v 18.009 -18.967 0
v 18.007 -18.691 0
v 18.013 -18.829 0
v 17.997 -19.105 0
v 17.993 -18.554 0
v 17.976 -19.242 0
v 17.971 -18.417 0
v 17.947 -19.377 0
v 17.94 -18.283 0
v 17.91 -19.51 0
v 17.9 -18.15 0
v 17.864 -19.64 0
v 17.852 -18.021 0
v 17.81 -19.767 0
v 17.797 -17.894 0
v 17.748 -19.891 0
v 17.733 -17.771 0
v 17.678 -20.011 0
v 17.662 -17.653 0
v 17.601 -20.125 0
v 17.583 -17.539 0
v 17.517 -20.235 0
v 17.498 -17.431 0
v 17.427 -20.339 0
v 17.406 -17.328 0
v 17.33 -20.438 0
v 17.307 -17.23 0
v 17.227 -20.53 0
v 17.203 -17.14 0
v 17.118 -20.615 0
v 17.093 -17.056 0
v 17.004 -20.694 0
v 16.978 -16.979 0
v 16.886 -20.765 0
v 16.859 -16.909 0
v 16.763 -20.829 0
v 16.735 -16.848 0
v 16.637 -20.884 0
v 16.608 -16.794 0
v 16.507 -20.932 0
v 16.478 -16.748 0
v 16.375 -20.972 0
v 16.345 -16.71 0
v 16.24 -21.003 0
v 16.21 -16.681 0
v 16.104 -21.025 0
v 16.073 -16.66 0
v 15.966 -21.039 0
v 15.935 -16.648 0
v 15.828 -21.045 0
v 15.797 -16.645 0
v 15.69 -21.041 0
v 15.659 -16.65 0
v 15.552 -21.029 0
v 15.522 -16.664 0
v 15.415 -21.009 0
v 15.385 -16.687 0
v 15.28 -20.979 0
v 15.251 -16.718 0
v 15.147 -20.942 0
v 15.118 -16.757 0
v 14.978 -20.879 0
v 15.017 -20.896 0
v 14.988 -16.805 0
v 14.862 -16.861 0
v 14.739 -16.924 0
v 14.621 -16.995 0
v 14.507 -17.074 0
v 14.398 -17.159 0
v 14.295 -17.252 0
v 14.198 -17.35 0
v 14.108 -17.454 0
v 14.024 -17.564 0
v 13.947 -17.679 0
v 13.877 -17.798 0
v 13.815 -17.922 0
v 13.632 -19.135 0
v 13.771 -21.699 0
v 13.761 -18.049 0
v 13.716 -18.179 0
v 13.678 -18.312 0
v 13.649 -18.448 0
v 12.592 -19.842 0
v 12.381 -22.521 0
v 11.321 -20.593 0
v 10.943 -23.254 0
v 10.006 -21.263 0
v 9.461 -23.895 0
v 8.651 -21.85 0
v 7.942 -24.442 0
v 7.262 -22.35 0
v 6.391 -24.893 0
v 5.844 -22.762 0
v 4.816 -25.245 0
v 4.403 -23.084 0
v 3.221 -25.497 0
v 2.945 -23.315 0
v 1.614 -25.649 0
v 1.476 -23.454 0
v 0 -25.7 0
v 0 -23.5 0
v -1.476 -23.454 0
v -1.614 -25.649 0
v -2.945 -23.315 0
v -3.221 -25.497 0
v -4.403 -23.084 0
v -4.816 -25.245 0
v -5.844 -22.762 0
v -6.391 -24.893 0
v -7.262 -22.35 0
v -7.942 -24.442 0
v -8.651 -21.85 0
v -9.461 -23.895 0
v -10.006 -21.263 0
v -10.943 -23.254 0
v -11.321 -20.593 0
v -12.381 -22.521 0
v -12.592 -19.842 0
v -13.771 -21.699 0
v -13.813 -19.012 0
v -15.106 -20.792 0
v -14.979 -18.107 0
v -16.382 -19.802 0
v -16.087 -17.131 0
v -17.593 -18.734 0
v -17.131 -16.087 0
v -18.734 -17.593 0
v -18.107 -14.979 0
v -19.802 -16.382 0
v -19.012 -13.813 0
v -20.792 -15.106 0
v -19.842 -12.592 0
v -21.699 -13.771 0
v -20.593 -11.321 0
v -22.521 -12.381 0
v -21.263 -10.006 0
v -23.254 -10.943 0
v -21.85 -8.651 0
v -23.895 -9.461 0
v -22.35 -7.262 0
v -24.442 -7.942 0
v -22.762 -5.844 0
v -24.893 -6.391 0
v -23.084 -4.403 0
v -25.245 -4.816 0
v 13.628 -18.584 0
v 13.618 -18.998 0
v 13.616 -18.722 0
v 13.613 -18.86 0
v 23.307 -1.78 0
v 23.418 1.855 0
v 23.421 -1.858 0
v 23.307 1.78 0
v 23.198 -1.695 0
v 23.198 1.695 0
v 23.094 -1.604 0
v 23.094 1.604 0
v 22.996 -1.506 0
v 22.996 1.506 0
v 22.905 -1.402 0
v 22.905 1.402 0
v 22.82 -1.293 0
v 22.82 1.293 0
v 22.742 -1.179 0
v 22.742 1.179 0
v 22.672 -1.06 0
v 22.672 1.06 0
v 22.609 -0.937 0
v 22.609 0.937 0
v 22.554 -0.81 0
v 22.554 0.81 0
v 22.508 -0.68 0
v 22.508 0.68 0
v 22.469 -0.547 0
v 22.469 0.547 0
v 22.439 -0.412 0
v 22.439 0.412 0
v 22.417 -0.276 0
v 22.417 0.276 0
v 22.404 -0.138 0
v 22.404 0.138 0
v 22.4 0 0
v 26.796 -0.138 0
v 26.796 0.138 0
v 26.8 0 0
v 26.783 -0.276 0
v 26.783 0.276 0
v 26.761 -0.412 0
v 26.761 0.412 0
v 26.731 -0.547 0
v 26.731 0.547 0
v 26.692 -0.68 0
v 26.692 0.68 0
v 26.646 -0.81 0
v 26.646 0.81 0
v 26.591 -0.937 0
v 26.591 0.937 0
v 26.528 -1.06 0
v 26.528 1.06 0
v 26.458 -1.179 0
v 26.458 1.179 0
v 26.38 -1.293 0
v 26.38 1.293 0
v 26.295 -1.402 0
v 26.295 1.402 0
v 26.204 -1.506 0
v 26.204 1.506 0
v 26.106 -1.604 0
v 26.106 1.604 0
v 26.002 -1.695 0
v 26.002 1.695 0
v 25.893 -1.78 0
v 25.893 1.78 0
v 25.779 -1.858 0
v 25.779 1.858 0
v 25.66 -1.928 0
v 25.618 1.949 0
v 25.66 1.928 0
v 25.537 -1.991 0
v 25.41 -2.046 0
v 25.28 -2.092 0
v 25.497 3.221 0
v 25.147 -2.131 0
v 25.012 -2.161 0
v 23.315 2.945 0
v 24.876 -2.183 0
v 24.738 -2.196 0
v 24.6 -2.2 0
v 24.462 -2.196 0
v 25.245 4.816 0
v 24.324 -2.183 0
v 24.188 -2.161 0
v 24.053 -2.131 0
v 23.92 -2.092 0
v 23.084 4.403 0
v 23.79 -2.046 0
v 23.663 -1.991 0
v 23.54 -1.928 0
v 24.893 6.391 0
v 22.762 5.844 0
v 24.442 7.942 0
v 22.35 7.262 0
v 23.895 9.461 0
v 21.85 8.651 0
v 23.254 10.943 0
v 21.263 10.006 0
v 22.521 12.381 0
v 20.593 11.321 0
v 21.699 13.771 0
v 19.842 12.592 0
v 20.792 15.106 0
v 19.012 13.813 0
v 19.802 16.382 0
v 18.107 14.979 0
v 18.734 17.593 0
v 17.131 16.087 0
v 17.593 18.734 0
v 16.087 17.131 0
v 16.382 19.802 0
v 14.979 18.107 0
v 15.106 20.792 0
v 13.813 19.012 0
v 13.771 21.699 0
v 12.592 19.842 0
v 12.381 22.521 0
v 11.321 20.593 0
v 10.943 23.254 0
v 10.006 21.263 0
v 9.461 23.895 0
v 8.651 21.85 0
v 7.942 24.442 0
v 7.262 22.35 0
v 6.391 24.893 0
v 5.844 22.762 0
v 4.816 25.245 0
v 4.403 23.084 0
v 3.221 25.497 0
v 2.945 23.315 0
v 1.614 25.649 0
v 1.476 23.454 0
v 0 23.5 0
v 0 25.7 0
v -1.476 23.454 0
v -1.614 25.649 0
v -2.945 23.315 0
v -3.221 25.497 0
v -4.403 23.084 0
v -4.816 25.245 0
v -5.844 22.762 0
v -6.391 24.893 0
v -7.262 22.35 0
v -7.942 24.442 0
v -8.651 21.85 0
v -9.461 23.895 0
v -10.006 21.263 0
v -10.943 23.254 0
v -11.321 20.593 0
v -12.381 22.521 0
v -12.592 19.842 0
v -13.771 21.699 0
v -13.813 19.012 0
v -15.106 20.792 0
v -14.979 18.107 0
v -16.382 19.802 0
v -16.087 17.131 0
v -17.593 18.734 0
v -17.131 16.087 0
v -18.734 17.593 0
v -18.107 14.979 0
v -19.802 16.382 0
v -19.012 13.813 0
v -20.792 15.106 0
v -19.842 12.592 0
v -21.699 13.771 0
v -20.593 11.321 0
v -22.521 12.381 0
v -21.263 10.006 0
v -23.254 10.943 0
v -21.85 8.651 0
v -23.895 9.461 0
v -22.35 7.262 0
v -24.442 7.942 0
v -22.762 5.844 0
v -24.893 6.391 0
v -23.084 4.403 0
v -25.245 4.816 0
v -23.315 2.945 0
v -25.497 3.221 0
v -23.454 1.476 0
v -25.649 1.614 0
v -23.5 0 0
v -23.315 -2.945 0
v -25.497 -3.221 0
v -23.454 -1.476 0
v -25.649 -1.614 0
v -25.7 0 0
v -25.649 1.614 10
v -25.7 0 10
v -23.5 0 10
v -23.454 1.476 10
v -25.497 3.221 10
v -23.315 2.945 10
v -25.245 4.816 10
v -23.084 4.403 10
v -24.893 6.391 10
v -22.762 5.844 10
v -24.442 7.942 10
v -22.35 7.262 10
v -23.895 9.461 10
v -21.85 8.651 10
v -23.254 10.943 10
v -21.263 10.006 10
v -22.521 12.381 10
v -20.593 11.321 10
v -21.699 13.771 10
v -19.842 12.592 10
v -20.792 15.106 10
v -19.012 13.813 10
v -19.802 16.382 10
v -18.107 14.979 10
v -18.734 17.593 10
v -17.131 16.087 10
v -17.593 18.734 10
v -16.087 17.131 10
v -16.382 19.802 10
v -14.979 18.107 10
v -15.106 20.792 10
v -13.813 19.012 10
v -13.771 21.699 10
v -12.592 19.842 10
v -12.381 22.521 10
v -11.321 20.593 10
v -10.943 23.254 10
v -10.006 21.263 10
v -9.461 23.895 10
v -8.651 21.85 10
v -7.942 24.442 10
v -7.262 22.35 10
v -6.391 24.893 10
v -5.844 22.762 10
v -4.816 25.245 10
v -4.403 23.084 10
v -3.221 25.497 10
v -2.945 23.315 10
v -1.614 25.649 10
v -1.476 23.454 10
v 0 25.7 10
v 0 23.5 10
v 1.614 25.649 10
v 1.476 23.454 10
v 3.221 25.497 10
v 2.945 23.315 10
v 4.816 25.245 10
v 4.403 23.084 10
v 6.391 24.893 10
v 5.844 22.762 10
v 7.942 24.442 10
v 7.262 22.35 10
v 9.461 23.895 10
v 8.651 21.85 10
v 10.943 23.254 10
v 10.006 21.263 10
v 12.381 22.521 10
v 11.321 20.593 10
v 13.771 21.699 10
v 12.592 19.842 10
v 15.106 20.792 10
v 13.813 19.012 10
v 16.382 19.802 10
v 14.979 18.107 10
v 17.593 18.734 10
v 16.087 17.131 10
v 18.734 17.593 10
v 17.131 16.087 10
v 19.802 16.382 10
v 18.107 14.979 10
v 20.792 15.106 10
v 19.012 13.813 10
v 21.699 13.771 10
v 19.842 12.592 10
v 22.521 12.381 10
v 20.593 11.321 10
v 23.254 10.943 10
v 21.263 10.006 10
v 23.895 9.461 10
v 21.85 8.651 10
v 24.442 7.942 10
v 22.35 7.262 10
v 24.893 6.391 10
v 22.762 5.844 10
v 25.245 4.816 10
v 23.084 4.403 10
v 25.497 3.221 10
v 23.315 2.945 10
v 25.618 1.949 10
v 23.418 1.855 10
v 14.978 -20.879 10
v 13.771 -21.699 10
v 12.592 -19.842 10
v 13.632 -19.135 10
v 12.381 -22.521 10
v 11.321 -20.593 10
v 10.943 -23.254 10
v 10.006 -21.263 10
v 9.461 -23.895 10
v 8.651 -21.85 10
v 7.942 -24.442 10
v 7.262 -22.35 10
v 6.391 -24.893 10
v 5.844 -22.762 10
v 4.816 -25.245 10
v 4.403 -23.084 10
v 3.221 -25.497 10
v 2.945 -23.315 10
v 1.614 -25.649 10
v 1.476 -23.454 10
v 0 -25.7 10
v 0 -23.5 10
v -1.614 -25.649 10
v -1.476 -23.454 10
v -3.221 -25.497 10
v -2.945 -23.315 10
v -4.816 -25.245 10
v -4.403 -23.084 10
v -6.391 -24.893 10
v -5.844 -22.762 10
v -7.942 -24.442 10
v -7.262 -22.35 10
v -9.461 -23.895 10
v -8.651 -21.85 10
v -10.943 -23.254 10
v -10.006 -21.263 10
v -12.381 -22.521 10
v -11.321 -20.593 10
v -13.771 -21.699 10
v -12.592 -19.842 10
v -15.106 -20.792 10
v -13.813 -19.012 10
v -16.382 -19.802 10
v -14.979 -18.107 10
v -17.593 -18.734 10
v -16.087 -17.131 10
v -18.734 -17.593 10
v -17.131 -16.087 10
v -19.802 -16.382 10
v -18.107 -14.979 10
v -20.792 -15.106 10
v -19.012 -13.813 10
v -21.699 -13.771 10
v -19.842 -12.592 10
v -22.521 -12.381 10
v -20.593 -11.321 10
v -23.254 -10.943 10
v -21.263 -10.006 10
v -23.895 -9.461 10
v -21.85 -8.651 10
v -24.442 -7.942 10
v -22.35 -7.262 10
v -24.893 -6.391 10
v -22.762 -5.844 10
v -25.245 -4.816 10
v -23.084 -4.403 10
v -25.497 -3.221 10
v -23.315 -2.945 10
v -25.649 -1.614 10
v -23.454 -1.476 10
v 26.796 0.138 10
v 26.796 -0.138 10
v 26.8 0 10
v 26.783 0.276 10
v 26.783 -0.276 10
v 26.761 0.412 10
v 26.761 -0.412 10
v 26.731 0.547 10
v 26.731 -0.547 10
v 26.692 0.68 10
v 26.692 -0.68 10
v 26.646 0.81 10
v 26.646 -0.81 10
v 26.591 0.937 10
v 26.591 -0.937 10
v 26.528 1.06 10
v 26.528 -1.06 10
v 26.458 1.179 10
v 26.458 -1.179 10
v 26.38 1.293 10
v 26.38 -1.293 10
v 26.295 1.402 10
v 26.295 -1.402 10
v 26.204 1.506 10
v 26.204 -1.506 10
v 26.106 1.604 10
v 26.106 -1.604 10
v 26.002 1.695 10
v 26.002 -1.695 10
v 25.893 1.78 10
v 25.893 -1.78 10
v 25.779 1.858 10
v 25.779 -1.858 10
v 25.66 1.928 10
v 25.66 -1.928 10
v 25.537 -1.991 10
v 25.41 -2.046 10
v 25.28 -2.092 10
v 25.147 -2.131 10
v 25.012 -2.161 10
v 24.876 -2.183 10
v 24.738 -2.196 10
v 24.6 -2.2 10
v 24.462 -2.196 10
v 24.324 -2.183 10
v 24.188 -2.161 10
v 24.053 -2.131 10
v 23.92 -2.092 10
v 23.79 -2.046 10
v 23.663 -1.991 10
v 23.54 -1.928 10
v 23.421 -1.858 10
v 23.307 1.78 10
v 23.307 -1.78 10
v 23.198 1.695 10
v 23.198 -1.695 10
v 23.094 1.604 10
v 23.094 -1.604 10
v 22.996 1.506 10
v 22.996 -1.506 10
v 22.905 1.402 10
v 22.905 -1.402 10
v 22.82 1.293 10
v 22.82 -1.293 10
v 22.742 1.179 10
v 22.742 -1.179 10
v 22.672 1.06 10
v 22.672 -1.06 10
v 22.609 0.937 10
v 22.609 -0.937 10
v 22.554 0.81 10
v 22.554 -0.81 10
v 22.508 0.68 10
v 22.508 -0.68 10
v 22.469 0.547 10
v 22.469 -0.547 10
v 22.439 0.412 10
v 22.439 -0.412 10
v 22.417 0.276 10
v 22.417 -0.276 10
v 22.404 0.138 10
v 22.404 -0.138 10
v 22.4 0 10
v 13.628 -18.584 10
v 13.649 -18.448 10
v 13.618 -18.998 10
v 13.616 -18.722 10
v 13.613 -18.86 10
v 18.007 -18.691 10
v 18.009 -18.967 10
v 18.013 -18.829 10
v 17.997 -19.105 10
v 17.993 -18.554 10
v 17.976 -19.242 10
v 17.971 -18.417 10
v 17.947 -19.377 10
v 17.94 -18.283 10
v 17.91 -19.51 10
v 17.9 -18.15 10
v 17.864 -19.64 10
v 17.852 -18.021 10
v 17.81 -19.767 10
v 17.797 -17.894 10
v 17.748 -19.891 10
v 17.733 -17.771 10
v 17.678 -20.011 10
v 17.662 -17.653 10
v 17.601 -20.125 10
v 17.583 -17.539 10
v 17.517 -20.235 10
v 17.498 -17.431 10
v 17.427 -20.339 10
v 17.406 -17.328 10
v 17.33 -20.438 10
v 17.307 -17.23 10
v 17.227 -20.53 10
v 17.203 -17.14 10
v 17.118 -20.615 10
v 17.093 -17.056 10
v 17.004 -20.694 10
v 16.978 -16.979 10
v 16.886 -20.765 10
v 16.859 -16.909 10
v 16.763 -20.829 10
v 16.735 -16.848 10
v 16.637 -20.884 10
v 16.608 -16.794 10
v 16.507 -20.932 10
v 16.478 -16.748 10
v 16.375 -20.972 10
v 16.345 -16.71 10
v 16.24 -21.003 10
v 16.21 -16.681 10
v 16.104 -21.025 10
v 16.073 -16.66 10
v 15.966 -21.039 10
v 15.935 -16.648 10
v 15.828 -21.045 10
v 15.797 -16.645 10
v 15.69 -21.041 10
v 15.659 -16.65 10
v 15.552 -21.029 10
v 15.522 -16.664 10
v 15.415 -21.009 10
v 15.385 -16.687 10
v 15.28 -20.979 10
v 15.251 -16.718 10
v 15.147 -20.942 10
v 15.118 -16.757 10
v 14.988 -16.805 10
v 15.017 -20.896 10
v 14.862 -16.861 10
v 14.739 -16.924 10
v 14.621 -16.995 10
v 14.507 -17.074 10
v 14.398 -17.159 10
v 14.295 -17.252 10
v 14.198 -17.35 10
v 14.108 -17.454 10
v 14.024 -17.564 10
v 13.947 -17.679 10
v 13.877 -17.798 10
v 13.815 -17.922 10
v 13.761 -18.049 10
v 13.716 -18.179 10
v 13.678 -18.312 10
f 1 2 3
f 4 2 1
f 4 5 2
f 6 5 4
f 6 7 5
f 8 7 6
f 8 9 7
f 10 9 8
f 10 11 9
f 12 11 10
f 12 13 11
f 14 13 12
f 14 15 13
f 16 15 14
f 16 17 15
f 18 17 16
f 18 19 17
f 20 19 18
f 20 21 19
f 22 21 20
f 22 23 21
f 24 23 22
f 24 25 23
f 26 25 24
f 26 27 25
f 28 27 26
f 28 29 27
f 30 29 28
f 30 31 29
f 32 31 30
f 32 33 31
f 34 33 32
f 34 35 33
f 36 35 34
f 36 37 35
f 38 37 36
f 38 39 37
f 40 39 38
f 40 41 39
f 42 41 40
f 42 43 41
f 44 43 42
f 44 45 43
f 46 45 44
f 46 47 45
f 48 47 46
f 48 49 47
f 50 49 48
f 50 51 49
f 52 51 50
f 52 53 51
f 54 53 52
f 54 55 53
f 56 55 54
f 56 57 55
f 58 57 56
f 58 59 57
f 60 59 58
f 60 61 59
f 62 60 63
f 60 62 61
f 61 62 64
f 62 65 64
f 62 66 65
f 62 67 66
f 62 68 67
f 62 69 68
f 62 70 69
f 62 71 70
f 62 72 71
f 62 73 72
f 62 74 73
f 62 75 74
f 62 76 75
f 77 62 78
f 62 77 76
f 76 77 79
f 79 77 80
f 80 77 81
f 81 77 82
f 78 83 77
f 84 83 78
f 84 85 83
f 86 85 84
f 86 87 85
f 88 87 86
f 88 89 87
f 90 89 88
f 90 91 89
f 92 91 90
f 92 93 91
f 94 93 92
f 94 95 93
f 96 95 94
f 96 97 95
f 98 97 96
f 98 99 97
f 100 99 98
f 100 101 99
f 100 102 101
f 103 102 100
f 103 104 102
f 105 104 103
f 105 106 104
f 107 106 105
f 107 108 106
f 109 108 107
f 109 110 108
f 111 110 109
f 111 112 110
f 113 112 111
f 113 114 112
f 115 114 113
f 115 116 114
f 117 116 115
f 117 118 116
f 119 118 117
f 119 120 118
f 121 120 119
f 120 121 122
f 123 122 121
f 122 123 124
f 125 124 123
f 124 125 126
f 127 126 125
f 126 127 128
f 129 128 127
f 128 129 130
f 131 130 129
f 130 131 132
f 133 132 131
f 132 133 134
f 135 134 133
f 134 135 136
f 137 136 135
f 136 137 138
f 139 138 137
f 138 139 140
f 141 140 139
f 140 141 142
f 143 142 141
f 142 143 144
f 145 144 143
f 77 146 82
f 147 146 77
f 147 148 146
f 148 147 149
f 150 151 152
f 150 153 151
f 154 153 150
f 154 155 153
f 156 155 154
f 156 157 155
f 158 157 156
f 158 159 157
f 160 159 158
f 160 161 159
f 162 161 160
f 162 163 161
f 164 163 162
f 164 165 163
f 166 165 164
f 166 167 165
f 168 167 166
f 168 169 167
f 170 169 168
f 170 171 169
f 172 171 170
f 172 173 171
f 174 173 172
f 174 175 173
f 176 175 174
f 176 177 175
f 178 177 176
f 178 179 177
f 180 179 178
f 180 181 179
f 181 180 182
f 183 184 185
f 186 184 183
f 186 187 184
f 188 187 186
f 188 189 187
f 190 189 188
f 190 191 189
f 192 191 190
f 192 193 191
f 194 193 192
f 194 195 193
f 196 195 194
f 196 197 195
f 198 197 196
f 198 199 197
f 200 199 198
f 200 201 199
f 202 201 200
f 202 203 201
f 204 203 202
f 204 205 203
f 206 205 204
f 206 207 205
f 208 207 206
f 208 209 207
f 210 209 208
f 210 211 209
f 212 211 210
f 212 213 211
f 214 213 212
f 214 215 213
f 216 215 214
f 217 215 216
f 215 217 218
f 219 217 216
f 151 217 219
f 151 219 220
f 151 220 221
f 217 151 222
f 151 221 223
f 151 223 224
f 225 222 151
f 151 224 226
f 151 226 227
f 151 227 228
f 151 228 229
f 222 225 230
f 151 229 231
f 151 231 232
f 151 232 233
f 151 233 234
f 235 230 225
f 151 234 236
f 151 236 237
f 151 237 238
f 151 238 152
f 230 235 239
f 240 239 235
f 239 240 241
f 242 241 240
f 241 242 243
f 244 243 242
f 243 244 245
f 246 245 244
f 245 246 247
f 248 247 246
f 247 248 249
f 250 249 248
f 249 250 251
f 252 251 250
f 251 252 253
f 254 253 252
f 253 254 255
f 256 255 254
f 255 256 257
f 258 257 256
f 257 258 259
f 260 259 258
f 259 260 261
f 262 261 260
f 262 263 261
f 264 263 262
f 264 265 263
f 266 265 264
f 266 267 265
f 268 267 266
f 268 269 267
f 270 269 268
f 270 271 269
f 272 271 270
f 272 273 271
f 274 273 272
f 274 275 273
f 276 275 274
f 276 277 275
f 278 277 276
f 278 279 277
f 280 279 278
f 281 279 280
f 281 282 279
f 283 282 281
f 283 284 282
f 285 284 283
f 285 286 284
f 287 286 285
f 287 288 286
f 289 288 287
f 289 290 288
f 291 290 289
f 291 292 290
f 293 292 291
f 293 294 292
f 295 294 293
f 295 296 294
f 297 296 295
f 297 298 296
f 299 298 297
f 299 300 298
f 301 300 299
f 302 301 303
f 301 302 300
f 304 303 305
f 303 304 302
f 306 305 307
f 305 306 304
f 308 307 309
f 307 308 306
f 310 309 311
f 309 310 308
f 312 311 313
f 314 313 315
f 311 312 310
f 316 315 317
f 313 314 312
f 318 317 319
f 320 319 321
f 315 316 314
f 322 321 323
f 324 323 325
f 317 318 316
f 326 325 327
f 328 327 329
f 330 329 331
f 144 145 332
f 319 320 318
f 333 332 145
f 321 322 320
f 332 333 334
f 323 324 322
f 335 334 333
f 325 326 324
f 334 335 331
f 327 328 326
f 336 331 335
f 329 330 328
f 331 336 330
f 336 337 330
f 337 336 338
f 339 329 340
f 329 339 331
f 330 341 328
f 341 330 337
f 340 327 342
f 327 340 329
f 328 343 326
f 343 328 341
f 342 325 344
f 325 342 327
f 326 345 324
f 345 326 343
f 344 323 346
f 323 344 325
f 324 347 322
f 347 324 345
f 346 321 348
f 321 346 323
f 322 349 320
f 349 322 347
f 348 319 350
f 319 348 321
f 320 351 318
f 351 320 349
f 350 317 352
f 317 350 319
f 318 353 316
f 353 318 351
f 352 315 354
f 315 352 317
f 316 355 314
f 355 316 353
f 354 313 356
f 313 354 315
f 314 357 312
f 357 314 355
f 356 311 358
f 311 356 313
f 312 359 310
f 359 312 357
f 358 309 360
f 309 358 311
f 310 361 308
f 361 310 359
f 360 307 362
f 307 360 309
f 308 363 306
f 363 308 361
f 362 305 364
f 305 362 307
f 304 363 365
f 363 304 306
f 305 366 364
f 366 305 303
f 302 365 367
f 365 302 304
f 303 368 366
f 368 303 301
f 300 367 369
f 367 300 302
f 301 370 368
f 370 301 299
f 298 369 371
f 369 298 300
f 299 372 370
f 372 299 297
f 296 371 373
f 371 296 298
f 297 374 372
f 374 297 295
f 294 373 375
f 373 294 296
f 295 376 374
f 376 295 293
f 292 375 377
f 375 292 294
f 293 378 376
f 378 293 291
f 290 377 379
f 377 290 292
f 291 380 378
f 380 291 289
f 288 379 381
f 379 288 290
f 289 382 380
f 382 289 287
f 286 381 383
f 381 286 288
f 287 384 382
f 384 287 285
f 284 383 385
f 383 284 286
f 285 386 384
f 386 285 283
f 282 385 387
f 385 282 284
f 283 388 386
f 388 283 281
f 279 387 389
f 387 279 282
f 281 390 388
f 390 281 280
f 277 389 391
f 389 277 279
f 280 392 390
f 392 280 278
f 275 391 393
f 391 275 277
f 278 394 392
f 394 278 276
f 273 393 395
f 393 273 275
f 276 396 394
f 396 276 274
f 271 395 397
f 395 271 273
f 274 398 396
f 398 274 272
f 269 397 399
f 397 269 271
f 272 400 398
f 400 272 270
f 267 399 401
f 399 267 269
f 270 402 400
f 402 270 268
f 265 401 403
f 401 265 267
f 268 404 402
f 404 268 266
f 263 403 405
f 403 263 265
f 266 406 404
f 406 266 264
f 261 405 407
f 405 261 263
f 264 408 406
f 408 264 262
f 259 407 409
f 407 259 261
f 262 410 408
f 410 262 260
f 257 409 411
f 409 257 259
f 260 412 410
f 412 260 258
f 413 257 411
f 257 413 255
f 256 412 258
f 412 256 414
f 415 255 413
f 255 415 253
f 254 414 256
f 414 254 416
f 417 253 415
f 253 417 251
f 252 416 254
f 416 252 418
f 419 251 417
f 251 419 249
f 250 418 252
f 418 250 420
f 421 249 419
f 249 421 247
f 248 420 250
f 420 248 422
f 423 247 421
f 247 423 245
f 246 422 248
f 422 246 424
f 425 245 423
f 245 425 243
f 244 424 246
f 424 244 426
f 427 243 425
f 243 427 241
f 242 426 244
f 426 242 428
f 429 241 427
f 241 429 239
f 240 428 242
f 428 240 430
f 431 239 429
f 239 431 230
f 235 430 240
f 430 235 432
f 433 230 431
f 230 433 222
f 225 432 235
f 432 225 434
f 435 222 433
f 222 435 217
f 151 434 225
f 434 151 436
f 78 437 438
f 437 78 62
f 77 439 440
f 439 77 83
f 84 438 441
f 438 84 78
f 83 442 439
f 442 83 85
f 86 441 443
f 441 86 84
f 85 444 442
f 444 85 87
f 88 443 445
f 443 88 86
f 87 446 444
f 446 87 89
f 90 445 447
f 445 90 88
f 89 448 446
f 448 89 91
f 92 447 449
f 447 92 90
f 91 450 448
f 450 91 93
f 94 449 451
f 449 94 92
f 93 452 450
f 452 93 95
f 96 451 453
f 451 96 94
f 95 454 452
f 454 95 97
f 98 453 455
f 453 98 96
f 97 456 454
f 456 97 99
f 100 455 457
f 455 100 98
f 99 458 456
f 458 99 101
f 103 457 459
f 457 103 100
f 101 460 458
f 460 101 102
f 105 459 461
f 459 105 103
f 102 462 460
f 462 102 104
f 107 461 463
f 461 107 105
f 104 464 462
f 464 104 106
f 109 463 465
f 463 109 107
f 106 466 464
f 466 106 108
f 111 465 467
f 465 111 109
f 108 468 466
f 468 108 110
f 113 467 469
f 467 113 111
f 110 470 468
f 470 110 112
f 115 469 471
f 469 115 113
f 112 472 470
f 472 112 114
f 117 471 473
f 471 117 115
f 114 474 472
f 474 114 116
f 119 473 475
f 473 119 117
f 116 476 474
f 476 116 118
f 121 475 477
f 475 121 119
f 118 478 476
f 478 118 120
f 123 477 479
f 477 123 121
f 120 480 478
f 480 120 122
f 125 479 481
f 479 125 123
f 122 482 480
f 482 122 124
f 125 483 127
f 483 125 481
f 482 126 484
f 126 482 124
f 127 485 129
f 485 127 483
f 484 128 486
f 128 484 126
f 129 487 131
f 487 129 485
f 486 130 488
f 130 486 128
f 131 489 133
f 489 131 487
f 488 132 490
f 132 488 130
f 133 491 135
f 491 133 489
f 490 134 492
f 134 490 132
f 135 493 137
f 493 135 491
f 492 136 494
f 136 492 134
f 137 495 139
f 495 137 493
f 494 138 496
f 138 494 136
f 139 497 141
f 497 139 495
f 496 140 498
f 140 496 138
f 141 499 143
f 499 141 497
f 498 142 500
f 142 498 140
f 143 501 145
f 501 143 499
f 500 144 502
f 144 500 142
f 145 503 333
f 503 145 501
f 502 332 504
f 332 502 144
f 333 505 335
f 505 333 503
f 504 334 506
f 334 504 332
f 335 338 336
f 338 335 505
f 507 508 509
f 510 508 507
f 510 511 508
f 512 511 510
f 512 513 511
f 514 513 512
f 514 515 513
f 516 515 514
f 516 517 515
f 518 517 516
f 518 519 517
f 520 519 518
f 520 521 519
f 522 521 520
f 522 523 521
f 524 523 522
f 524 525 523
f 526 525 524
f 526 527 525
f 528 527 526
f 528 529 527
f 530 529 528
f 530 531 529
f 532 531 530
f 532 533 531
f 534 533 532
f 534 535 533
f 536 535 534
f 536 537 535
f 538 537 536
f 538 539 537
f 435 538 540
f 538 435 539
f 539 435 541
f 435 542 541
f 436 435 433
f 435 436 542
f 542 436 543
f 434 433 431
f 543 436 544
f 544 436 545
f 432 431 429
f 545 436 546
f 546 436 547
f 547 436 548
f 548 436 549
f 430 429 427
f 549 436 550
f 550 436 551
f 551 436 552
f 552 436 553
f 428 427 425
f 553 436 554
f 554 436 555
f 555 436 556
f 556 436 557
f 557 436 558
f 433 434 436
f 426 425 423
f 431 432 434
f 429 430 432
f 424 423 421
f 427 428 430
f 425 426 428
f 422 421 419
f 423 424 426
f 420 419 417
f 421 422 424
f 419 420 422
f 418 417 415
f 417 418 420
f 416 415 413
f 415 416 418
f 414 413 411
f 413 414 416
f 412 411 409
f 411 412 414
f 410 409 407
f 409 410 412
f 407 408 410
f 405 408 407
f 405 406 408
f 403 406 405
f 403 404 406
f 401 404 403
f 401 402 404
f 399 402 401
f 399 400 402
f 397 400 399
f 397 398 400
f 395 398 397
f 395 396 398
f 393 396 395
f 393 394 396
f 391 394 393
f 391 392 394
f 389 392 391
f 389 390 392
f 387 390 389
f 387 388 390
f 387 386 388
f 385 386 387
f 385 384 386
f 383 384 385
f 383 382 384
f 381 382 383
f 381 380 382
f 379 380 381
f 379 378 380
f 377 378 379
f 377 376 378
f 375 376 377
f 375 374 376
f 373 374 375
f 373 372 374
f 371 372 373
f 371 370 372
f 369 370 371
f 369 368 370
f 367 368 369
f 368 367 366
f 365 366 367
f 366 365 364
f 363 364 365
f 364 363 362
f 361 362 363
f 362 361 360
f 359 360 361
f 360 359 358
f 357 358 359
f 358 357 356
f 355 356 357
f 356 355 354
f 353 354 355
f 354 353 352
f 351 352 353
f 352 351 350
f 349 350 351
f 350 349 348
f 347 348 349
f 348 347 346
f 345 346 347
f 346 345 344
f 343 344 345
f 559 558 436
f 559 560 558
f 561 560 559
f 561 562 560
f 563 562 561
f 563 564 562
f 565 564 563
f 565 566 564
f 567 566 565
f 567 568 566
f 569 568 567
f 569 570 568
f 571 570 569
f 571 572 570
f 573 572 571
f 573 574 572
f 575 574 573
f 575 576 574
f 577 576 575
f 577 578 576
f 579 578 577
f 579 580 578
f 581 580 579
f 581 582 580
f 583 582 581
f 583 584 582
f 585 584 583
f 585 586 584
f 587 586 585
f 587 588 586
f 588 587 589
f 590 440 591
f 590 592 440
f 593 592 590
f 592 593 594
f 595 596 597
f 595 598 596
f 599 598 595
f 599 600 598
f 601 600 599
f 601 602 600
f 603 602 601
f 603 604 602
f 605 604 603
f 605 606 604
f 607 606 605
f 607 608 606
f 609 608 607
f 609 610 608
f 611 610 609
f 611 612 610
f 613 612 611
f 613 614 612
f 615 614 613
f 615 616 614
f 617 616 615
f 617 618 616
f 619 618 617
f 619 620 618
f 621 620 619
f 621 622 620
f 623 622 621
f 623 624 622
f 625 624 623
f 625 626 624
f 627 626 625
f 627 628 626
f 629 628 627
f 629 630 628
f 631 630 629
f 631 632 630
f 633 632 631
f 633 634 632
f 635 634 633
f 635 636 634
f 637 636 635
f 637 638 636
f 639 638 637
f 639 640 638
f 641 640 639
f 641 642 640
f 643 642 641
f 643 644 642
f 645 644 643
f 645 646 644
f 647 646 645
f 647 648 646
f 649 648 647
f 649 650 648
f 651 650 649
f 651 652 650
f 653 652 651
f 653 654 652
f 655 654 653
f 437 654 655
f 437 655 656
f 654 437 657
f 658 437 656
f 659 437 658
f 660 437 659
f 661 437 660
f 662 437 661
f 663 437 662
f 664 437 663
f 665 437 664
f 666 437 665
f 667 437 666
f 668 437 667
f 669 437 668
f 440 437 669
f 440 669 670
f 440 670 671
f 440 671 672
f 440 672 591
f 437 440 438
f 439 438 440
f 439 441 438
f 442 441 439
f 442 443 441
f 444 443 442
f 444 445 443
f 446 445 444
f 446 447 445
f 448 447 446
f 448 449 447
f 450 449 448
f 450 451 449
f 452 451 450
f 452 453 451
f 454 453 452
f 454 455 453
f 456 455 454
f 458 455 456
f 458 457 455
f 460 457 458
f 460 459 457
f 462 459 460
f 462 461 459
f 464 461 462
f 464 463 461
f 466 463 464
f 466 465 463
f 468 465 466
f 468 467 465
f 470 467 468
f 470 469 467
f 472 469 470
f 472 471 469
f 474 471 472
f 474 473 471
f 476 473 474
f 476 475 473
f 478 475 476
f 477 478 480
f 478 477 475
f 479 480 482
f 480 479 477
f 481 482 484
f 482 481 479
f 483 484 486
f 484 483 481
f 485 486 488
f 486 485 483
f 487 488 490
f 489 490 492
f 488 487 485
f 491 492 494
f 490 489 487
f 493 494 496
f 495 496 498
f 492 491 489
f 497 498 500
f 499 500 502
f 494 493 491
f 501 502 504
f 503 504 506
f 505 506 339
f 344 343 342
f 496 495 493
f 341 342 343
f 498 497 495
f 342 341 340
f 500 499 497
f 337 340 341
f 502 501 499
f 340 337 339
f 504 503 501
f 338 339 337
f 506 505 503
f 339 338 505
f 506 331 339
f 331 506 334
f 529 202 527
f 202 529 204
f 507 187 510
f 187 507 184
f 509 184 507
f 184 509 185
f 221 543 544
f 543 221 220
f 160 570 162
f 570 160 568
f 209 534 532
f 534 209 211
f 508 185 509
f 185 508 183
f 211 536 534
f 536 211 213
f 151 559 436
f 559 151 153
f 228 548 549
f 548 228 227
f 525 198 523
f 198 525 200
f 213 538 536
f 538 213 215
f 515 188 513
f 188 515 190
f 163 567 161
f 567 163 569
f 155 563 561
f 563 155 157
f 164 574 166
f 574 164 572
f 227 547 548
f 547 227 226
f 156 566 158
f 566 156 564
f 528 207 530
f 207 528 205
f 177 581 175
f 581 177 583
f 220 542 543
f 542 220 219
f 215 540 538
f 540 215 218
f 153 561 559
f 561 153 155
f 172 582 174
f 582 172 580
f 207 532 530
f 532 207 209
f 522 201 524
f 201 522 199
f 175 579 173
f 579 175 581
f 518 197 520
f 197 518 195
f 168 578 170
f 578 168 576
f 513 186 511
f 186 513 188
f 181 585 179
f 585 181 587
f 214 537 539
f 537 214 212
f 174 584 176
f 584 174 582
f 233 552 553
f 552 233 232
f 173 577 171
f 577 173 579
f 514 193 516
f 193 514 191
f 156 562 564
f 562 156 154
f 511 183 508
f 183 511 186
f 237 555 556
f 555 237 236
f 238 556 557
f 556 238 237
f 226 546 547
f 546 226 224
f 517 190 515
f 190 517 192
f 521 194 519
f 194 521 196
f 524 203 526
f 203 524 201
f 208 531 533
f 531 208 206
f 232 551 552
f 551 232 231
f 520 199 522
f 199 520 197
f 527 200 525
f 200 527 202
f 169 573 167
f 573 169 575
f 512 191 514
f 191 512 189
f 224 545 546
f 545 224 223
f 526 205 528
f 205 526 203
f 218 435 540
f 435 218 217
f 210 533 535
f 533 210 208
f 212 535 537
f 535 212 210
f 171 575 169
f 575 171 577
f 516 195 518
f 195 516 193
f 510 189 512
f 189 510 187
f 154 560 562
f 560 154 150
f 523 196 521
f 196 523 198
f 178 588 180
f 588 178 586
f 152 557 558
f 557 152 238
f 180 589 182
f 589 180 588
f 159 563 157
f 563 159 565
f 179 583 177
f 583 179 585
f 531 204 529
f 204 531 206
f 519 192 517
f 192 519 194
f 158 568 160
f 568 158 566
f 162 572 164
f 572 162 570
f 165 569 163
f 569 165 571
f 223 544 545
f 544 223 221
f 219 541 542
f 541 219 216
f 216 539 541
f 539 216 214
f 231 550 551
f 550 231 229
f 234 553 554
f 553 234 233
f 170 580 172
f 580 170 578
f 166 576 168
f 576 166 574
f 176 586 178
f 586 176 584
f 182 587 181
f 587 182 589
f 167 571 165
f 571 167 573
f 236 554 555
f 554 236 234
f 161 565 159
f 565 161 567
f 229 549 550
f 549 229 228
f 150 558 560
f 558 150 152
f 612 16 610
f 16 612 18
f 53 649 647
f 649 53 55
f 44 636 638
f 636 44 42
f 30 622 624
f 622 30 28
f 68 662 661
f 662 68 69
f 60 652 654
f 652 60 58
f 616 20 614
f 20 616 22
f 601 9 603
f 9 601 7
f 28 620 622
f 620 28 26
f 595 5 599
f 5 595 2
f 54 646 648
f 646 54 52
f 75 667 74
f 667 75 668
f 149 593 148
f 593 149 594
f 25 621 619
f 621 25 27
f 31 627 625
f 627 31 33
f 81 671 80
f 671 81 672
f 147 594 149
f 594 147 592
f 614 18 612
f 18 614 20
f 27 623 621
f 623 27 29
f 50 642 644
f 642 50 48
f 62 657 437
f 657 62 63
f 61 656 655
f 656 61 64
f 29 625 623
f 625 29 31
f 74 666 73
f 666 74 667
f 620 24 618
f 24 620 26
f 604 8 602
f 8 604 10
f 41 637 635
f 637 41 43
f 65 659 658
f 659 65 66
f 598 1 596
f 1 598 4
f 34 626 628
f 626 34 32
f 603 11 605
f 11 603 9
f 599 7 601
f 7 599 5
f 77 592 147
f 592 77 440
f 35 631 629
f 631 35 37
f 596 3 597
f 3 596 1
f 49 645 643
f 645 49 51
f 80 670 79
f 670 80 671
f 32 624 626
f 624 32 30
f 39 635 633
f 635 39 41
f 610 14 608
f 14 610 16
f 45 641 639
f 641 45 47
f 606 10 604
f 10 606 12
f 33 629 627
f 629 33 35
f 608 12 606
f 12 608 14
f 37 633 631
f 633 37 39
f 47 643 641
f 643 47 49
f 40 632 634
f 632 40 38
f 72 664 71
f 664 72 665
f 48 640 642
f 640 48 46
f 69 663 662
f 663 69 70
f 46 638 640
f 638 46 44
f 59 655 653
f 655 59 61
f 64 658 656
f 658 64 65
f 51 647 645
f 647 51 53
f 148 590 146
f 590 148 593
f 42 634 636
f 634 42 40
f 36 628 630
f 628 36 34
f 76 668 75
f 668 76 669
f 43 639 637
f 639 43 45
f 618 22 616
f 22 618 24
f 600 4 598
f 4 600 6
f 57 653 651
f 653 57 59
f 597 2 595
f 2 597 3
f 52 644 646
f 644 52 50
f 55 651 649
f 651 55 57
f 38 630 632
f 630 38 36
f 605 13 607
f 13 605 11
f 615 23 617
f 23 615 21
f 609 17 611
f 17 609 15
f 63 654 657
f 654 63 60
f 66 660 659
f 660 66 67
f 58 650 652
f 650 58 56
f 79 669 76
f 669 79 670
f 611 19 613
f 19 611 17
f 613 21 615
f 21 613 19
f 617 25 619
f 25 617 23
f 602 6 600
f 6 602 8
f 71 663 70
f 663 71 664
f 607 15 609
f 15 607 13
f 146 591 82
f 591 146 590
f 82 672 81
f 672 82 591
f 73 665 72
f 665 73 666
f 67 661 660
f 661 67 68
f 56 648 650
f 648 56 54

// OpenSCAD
// Customizable Wrapping Paper Holder
// Created by Rob Ross, March 2014
//
// Inspired by "Wrapping Paper Holder" by Corey Brown
//   http://www.thingiverse.com/thing:36166
//
// Code for partial_rotate_extrude(), including pie_slice(), was written by CarryTheWhat:
// and licensed under the GNU - LGPL license. See:
//   http://carrythewhat.com/
//   https://www.thingiverse.com/thing:34027
//
// Customizable Wrapping Paper Holder is shared under GNU - LGPL license.

// preview[view:south east, tilt:top diagonal]

/* [Size] */
// Diameter of the roll to be held by the holder (cm)
roll_dia_cm = 4.7;

/* [Count] */
count = 1; // [1,2]

/* [Tweaks] */
// Thickness of the holder in the radial direction (mm)
holder_thickness_mm = 2.2;
// Height of the holder along the roll of paper (mm)
holder_height_mm = 10;
// Angle of cutout in holder (degrees)
holder_cut_angle = 50; // [35:80]

/* [Hidden] */
$fn=100;

holder();
if (count == 2) {
	translate([roll_dia_cm * 2.5, -1 * roll_dia_cm * 6.55, 0]) rotate([0,0,180]) holder();
}

// holder() -- create a complete holder
module holder() {
	// Create ring
	partial_rotate_extrude(angle = 360-holder_cut_angle, 
				    radius = roll_dia_cm * 5, convex=2)
				    square([holder_thickness_mm, holder_height_mm]);

	// Round the ends of the holder
	translate([roll_dia_cm * 5 + holder_thickness_mm / 2, 0, 0]) 
		cylinder(r=holder_thickness_mm, h=holder_height_mm);
	rotate([0,0,-1 * holder_cut_angle]) 
		translate([roll_dia_cm * 5 + holder_thickness_mm / 2, 0, 0]) 
			cylinder(r=holder_thickness_mm, h=holder_height_mm);
}

// Code below from CarryTheWhat Partial Rorate Extrude thing, licensed under LGPL:
//   https://www.thingiverse.com/thing:34027

module partial_rotate_extrude(angle, radius, convex) {
	intersection () {
		rotate_extrude(convexity=convex) translate([radius,0,0]) child(0);
		pie_slice(radius*2, angle, angle/5);
	}
}

module pie_slice(radius, angle, step) {
	for(theta = [0:step:angle-step]) {
		rotate([0,0,0])
		linear_extrude(height = radius*2, center=true)
		polygon(points = [
			  [0,0],
			  [radius * cos(theta+step) ,radius * sin(theta+step)],
			  [radius*cos(theta),radius*sin(theta)]
			 ] 
		);
	}
}
